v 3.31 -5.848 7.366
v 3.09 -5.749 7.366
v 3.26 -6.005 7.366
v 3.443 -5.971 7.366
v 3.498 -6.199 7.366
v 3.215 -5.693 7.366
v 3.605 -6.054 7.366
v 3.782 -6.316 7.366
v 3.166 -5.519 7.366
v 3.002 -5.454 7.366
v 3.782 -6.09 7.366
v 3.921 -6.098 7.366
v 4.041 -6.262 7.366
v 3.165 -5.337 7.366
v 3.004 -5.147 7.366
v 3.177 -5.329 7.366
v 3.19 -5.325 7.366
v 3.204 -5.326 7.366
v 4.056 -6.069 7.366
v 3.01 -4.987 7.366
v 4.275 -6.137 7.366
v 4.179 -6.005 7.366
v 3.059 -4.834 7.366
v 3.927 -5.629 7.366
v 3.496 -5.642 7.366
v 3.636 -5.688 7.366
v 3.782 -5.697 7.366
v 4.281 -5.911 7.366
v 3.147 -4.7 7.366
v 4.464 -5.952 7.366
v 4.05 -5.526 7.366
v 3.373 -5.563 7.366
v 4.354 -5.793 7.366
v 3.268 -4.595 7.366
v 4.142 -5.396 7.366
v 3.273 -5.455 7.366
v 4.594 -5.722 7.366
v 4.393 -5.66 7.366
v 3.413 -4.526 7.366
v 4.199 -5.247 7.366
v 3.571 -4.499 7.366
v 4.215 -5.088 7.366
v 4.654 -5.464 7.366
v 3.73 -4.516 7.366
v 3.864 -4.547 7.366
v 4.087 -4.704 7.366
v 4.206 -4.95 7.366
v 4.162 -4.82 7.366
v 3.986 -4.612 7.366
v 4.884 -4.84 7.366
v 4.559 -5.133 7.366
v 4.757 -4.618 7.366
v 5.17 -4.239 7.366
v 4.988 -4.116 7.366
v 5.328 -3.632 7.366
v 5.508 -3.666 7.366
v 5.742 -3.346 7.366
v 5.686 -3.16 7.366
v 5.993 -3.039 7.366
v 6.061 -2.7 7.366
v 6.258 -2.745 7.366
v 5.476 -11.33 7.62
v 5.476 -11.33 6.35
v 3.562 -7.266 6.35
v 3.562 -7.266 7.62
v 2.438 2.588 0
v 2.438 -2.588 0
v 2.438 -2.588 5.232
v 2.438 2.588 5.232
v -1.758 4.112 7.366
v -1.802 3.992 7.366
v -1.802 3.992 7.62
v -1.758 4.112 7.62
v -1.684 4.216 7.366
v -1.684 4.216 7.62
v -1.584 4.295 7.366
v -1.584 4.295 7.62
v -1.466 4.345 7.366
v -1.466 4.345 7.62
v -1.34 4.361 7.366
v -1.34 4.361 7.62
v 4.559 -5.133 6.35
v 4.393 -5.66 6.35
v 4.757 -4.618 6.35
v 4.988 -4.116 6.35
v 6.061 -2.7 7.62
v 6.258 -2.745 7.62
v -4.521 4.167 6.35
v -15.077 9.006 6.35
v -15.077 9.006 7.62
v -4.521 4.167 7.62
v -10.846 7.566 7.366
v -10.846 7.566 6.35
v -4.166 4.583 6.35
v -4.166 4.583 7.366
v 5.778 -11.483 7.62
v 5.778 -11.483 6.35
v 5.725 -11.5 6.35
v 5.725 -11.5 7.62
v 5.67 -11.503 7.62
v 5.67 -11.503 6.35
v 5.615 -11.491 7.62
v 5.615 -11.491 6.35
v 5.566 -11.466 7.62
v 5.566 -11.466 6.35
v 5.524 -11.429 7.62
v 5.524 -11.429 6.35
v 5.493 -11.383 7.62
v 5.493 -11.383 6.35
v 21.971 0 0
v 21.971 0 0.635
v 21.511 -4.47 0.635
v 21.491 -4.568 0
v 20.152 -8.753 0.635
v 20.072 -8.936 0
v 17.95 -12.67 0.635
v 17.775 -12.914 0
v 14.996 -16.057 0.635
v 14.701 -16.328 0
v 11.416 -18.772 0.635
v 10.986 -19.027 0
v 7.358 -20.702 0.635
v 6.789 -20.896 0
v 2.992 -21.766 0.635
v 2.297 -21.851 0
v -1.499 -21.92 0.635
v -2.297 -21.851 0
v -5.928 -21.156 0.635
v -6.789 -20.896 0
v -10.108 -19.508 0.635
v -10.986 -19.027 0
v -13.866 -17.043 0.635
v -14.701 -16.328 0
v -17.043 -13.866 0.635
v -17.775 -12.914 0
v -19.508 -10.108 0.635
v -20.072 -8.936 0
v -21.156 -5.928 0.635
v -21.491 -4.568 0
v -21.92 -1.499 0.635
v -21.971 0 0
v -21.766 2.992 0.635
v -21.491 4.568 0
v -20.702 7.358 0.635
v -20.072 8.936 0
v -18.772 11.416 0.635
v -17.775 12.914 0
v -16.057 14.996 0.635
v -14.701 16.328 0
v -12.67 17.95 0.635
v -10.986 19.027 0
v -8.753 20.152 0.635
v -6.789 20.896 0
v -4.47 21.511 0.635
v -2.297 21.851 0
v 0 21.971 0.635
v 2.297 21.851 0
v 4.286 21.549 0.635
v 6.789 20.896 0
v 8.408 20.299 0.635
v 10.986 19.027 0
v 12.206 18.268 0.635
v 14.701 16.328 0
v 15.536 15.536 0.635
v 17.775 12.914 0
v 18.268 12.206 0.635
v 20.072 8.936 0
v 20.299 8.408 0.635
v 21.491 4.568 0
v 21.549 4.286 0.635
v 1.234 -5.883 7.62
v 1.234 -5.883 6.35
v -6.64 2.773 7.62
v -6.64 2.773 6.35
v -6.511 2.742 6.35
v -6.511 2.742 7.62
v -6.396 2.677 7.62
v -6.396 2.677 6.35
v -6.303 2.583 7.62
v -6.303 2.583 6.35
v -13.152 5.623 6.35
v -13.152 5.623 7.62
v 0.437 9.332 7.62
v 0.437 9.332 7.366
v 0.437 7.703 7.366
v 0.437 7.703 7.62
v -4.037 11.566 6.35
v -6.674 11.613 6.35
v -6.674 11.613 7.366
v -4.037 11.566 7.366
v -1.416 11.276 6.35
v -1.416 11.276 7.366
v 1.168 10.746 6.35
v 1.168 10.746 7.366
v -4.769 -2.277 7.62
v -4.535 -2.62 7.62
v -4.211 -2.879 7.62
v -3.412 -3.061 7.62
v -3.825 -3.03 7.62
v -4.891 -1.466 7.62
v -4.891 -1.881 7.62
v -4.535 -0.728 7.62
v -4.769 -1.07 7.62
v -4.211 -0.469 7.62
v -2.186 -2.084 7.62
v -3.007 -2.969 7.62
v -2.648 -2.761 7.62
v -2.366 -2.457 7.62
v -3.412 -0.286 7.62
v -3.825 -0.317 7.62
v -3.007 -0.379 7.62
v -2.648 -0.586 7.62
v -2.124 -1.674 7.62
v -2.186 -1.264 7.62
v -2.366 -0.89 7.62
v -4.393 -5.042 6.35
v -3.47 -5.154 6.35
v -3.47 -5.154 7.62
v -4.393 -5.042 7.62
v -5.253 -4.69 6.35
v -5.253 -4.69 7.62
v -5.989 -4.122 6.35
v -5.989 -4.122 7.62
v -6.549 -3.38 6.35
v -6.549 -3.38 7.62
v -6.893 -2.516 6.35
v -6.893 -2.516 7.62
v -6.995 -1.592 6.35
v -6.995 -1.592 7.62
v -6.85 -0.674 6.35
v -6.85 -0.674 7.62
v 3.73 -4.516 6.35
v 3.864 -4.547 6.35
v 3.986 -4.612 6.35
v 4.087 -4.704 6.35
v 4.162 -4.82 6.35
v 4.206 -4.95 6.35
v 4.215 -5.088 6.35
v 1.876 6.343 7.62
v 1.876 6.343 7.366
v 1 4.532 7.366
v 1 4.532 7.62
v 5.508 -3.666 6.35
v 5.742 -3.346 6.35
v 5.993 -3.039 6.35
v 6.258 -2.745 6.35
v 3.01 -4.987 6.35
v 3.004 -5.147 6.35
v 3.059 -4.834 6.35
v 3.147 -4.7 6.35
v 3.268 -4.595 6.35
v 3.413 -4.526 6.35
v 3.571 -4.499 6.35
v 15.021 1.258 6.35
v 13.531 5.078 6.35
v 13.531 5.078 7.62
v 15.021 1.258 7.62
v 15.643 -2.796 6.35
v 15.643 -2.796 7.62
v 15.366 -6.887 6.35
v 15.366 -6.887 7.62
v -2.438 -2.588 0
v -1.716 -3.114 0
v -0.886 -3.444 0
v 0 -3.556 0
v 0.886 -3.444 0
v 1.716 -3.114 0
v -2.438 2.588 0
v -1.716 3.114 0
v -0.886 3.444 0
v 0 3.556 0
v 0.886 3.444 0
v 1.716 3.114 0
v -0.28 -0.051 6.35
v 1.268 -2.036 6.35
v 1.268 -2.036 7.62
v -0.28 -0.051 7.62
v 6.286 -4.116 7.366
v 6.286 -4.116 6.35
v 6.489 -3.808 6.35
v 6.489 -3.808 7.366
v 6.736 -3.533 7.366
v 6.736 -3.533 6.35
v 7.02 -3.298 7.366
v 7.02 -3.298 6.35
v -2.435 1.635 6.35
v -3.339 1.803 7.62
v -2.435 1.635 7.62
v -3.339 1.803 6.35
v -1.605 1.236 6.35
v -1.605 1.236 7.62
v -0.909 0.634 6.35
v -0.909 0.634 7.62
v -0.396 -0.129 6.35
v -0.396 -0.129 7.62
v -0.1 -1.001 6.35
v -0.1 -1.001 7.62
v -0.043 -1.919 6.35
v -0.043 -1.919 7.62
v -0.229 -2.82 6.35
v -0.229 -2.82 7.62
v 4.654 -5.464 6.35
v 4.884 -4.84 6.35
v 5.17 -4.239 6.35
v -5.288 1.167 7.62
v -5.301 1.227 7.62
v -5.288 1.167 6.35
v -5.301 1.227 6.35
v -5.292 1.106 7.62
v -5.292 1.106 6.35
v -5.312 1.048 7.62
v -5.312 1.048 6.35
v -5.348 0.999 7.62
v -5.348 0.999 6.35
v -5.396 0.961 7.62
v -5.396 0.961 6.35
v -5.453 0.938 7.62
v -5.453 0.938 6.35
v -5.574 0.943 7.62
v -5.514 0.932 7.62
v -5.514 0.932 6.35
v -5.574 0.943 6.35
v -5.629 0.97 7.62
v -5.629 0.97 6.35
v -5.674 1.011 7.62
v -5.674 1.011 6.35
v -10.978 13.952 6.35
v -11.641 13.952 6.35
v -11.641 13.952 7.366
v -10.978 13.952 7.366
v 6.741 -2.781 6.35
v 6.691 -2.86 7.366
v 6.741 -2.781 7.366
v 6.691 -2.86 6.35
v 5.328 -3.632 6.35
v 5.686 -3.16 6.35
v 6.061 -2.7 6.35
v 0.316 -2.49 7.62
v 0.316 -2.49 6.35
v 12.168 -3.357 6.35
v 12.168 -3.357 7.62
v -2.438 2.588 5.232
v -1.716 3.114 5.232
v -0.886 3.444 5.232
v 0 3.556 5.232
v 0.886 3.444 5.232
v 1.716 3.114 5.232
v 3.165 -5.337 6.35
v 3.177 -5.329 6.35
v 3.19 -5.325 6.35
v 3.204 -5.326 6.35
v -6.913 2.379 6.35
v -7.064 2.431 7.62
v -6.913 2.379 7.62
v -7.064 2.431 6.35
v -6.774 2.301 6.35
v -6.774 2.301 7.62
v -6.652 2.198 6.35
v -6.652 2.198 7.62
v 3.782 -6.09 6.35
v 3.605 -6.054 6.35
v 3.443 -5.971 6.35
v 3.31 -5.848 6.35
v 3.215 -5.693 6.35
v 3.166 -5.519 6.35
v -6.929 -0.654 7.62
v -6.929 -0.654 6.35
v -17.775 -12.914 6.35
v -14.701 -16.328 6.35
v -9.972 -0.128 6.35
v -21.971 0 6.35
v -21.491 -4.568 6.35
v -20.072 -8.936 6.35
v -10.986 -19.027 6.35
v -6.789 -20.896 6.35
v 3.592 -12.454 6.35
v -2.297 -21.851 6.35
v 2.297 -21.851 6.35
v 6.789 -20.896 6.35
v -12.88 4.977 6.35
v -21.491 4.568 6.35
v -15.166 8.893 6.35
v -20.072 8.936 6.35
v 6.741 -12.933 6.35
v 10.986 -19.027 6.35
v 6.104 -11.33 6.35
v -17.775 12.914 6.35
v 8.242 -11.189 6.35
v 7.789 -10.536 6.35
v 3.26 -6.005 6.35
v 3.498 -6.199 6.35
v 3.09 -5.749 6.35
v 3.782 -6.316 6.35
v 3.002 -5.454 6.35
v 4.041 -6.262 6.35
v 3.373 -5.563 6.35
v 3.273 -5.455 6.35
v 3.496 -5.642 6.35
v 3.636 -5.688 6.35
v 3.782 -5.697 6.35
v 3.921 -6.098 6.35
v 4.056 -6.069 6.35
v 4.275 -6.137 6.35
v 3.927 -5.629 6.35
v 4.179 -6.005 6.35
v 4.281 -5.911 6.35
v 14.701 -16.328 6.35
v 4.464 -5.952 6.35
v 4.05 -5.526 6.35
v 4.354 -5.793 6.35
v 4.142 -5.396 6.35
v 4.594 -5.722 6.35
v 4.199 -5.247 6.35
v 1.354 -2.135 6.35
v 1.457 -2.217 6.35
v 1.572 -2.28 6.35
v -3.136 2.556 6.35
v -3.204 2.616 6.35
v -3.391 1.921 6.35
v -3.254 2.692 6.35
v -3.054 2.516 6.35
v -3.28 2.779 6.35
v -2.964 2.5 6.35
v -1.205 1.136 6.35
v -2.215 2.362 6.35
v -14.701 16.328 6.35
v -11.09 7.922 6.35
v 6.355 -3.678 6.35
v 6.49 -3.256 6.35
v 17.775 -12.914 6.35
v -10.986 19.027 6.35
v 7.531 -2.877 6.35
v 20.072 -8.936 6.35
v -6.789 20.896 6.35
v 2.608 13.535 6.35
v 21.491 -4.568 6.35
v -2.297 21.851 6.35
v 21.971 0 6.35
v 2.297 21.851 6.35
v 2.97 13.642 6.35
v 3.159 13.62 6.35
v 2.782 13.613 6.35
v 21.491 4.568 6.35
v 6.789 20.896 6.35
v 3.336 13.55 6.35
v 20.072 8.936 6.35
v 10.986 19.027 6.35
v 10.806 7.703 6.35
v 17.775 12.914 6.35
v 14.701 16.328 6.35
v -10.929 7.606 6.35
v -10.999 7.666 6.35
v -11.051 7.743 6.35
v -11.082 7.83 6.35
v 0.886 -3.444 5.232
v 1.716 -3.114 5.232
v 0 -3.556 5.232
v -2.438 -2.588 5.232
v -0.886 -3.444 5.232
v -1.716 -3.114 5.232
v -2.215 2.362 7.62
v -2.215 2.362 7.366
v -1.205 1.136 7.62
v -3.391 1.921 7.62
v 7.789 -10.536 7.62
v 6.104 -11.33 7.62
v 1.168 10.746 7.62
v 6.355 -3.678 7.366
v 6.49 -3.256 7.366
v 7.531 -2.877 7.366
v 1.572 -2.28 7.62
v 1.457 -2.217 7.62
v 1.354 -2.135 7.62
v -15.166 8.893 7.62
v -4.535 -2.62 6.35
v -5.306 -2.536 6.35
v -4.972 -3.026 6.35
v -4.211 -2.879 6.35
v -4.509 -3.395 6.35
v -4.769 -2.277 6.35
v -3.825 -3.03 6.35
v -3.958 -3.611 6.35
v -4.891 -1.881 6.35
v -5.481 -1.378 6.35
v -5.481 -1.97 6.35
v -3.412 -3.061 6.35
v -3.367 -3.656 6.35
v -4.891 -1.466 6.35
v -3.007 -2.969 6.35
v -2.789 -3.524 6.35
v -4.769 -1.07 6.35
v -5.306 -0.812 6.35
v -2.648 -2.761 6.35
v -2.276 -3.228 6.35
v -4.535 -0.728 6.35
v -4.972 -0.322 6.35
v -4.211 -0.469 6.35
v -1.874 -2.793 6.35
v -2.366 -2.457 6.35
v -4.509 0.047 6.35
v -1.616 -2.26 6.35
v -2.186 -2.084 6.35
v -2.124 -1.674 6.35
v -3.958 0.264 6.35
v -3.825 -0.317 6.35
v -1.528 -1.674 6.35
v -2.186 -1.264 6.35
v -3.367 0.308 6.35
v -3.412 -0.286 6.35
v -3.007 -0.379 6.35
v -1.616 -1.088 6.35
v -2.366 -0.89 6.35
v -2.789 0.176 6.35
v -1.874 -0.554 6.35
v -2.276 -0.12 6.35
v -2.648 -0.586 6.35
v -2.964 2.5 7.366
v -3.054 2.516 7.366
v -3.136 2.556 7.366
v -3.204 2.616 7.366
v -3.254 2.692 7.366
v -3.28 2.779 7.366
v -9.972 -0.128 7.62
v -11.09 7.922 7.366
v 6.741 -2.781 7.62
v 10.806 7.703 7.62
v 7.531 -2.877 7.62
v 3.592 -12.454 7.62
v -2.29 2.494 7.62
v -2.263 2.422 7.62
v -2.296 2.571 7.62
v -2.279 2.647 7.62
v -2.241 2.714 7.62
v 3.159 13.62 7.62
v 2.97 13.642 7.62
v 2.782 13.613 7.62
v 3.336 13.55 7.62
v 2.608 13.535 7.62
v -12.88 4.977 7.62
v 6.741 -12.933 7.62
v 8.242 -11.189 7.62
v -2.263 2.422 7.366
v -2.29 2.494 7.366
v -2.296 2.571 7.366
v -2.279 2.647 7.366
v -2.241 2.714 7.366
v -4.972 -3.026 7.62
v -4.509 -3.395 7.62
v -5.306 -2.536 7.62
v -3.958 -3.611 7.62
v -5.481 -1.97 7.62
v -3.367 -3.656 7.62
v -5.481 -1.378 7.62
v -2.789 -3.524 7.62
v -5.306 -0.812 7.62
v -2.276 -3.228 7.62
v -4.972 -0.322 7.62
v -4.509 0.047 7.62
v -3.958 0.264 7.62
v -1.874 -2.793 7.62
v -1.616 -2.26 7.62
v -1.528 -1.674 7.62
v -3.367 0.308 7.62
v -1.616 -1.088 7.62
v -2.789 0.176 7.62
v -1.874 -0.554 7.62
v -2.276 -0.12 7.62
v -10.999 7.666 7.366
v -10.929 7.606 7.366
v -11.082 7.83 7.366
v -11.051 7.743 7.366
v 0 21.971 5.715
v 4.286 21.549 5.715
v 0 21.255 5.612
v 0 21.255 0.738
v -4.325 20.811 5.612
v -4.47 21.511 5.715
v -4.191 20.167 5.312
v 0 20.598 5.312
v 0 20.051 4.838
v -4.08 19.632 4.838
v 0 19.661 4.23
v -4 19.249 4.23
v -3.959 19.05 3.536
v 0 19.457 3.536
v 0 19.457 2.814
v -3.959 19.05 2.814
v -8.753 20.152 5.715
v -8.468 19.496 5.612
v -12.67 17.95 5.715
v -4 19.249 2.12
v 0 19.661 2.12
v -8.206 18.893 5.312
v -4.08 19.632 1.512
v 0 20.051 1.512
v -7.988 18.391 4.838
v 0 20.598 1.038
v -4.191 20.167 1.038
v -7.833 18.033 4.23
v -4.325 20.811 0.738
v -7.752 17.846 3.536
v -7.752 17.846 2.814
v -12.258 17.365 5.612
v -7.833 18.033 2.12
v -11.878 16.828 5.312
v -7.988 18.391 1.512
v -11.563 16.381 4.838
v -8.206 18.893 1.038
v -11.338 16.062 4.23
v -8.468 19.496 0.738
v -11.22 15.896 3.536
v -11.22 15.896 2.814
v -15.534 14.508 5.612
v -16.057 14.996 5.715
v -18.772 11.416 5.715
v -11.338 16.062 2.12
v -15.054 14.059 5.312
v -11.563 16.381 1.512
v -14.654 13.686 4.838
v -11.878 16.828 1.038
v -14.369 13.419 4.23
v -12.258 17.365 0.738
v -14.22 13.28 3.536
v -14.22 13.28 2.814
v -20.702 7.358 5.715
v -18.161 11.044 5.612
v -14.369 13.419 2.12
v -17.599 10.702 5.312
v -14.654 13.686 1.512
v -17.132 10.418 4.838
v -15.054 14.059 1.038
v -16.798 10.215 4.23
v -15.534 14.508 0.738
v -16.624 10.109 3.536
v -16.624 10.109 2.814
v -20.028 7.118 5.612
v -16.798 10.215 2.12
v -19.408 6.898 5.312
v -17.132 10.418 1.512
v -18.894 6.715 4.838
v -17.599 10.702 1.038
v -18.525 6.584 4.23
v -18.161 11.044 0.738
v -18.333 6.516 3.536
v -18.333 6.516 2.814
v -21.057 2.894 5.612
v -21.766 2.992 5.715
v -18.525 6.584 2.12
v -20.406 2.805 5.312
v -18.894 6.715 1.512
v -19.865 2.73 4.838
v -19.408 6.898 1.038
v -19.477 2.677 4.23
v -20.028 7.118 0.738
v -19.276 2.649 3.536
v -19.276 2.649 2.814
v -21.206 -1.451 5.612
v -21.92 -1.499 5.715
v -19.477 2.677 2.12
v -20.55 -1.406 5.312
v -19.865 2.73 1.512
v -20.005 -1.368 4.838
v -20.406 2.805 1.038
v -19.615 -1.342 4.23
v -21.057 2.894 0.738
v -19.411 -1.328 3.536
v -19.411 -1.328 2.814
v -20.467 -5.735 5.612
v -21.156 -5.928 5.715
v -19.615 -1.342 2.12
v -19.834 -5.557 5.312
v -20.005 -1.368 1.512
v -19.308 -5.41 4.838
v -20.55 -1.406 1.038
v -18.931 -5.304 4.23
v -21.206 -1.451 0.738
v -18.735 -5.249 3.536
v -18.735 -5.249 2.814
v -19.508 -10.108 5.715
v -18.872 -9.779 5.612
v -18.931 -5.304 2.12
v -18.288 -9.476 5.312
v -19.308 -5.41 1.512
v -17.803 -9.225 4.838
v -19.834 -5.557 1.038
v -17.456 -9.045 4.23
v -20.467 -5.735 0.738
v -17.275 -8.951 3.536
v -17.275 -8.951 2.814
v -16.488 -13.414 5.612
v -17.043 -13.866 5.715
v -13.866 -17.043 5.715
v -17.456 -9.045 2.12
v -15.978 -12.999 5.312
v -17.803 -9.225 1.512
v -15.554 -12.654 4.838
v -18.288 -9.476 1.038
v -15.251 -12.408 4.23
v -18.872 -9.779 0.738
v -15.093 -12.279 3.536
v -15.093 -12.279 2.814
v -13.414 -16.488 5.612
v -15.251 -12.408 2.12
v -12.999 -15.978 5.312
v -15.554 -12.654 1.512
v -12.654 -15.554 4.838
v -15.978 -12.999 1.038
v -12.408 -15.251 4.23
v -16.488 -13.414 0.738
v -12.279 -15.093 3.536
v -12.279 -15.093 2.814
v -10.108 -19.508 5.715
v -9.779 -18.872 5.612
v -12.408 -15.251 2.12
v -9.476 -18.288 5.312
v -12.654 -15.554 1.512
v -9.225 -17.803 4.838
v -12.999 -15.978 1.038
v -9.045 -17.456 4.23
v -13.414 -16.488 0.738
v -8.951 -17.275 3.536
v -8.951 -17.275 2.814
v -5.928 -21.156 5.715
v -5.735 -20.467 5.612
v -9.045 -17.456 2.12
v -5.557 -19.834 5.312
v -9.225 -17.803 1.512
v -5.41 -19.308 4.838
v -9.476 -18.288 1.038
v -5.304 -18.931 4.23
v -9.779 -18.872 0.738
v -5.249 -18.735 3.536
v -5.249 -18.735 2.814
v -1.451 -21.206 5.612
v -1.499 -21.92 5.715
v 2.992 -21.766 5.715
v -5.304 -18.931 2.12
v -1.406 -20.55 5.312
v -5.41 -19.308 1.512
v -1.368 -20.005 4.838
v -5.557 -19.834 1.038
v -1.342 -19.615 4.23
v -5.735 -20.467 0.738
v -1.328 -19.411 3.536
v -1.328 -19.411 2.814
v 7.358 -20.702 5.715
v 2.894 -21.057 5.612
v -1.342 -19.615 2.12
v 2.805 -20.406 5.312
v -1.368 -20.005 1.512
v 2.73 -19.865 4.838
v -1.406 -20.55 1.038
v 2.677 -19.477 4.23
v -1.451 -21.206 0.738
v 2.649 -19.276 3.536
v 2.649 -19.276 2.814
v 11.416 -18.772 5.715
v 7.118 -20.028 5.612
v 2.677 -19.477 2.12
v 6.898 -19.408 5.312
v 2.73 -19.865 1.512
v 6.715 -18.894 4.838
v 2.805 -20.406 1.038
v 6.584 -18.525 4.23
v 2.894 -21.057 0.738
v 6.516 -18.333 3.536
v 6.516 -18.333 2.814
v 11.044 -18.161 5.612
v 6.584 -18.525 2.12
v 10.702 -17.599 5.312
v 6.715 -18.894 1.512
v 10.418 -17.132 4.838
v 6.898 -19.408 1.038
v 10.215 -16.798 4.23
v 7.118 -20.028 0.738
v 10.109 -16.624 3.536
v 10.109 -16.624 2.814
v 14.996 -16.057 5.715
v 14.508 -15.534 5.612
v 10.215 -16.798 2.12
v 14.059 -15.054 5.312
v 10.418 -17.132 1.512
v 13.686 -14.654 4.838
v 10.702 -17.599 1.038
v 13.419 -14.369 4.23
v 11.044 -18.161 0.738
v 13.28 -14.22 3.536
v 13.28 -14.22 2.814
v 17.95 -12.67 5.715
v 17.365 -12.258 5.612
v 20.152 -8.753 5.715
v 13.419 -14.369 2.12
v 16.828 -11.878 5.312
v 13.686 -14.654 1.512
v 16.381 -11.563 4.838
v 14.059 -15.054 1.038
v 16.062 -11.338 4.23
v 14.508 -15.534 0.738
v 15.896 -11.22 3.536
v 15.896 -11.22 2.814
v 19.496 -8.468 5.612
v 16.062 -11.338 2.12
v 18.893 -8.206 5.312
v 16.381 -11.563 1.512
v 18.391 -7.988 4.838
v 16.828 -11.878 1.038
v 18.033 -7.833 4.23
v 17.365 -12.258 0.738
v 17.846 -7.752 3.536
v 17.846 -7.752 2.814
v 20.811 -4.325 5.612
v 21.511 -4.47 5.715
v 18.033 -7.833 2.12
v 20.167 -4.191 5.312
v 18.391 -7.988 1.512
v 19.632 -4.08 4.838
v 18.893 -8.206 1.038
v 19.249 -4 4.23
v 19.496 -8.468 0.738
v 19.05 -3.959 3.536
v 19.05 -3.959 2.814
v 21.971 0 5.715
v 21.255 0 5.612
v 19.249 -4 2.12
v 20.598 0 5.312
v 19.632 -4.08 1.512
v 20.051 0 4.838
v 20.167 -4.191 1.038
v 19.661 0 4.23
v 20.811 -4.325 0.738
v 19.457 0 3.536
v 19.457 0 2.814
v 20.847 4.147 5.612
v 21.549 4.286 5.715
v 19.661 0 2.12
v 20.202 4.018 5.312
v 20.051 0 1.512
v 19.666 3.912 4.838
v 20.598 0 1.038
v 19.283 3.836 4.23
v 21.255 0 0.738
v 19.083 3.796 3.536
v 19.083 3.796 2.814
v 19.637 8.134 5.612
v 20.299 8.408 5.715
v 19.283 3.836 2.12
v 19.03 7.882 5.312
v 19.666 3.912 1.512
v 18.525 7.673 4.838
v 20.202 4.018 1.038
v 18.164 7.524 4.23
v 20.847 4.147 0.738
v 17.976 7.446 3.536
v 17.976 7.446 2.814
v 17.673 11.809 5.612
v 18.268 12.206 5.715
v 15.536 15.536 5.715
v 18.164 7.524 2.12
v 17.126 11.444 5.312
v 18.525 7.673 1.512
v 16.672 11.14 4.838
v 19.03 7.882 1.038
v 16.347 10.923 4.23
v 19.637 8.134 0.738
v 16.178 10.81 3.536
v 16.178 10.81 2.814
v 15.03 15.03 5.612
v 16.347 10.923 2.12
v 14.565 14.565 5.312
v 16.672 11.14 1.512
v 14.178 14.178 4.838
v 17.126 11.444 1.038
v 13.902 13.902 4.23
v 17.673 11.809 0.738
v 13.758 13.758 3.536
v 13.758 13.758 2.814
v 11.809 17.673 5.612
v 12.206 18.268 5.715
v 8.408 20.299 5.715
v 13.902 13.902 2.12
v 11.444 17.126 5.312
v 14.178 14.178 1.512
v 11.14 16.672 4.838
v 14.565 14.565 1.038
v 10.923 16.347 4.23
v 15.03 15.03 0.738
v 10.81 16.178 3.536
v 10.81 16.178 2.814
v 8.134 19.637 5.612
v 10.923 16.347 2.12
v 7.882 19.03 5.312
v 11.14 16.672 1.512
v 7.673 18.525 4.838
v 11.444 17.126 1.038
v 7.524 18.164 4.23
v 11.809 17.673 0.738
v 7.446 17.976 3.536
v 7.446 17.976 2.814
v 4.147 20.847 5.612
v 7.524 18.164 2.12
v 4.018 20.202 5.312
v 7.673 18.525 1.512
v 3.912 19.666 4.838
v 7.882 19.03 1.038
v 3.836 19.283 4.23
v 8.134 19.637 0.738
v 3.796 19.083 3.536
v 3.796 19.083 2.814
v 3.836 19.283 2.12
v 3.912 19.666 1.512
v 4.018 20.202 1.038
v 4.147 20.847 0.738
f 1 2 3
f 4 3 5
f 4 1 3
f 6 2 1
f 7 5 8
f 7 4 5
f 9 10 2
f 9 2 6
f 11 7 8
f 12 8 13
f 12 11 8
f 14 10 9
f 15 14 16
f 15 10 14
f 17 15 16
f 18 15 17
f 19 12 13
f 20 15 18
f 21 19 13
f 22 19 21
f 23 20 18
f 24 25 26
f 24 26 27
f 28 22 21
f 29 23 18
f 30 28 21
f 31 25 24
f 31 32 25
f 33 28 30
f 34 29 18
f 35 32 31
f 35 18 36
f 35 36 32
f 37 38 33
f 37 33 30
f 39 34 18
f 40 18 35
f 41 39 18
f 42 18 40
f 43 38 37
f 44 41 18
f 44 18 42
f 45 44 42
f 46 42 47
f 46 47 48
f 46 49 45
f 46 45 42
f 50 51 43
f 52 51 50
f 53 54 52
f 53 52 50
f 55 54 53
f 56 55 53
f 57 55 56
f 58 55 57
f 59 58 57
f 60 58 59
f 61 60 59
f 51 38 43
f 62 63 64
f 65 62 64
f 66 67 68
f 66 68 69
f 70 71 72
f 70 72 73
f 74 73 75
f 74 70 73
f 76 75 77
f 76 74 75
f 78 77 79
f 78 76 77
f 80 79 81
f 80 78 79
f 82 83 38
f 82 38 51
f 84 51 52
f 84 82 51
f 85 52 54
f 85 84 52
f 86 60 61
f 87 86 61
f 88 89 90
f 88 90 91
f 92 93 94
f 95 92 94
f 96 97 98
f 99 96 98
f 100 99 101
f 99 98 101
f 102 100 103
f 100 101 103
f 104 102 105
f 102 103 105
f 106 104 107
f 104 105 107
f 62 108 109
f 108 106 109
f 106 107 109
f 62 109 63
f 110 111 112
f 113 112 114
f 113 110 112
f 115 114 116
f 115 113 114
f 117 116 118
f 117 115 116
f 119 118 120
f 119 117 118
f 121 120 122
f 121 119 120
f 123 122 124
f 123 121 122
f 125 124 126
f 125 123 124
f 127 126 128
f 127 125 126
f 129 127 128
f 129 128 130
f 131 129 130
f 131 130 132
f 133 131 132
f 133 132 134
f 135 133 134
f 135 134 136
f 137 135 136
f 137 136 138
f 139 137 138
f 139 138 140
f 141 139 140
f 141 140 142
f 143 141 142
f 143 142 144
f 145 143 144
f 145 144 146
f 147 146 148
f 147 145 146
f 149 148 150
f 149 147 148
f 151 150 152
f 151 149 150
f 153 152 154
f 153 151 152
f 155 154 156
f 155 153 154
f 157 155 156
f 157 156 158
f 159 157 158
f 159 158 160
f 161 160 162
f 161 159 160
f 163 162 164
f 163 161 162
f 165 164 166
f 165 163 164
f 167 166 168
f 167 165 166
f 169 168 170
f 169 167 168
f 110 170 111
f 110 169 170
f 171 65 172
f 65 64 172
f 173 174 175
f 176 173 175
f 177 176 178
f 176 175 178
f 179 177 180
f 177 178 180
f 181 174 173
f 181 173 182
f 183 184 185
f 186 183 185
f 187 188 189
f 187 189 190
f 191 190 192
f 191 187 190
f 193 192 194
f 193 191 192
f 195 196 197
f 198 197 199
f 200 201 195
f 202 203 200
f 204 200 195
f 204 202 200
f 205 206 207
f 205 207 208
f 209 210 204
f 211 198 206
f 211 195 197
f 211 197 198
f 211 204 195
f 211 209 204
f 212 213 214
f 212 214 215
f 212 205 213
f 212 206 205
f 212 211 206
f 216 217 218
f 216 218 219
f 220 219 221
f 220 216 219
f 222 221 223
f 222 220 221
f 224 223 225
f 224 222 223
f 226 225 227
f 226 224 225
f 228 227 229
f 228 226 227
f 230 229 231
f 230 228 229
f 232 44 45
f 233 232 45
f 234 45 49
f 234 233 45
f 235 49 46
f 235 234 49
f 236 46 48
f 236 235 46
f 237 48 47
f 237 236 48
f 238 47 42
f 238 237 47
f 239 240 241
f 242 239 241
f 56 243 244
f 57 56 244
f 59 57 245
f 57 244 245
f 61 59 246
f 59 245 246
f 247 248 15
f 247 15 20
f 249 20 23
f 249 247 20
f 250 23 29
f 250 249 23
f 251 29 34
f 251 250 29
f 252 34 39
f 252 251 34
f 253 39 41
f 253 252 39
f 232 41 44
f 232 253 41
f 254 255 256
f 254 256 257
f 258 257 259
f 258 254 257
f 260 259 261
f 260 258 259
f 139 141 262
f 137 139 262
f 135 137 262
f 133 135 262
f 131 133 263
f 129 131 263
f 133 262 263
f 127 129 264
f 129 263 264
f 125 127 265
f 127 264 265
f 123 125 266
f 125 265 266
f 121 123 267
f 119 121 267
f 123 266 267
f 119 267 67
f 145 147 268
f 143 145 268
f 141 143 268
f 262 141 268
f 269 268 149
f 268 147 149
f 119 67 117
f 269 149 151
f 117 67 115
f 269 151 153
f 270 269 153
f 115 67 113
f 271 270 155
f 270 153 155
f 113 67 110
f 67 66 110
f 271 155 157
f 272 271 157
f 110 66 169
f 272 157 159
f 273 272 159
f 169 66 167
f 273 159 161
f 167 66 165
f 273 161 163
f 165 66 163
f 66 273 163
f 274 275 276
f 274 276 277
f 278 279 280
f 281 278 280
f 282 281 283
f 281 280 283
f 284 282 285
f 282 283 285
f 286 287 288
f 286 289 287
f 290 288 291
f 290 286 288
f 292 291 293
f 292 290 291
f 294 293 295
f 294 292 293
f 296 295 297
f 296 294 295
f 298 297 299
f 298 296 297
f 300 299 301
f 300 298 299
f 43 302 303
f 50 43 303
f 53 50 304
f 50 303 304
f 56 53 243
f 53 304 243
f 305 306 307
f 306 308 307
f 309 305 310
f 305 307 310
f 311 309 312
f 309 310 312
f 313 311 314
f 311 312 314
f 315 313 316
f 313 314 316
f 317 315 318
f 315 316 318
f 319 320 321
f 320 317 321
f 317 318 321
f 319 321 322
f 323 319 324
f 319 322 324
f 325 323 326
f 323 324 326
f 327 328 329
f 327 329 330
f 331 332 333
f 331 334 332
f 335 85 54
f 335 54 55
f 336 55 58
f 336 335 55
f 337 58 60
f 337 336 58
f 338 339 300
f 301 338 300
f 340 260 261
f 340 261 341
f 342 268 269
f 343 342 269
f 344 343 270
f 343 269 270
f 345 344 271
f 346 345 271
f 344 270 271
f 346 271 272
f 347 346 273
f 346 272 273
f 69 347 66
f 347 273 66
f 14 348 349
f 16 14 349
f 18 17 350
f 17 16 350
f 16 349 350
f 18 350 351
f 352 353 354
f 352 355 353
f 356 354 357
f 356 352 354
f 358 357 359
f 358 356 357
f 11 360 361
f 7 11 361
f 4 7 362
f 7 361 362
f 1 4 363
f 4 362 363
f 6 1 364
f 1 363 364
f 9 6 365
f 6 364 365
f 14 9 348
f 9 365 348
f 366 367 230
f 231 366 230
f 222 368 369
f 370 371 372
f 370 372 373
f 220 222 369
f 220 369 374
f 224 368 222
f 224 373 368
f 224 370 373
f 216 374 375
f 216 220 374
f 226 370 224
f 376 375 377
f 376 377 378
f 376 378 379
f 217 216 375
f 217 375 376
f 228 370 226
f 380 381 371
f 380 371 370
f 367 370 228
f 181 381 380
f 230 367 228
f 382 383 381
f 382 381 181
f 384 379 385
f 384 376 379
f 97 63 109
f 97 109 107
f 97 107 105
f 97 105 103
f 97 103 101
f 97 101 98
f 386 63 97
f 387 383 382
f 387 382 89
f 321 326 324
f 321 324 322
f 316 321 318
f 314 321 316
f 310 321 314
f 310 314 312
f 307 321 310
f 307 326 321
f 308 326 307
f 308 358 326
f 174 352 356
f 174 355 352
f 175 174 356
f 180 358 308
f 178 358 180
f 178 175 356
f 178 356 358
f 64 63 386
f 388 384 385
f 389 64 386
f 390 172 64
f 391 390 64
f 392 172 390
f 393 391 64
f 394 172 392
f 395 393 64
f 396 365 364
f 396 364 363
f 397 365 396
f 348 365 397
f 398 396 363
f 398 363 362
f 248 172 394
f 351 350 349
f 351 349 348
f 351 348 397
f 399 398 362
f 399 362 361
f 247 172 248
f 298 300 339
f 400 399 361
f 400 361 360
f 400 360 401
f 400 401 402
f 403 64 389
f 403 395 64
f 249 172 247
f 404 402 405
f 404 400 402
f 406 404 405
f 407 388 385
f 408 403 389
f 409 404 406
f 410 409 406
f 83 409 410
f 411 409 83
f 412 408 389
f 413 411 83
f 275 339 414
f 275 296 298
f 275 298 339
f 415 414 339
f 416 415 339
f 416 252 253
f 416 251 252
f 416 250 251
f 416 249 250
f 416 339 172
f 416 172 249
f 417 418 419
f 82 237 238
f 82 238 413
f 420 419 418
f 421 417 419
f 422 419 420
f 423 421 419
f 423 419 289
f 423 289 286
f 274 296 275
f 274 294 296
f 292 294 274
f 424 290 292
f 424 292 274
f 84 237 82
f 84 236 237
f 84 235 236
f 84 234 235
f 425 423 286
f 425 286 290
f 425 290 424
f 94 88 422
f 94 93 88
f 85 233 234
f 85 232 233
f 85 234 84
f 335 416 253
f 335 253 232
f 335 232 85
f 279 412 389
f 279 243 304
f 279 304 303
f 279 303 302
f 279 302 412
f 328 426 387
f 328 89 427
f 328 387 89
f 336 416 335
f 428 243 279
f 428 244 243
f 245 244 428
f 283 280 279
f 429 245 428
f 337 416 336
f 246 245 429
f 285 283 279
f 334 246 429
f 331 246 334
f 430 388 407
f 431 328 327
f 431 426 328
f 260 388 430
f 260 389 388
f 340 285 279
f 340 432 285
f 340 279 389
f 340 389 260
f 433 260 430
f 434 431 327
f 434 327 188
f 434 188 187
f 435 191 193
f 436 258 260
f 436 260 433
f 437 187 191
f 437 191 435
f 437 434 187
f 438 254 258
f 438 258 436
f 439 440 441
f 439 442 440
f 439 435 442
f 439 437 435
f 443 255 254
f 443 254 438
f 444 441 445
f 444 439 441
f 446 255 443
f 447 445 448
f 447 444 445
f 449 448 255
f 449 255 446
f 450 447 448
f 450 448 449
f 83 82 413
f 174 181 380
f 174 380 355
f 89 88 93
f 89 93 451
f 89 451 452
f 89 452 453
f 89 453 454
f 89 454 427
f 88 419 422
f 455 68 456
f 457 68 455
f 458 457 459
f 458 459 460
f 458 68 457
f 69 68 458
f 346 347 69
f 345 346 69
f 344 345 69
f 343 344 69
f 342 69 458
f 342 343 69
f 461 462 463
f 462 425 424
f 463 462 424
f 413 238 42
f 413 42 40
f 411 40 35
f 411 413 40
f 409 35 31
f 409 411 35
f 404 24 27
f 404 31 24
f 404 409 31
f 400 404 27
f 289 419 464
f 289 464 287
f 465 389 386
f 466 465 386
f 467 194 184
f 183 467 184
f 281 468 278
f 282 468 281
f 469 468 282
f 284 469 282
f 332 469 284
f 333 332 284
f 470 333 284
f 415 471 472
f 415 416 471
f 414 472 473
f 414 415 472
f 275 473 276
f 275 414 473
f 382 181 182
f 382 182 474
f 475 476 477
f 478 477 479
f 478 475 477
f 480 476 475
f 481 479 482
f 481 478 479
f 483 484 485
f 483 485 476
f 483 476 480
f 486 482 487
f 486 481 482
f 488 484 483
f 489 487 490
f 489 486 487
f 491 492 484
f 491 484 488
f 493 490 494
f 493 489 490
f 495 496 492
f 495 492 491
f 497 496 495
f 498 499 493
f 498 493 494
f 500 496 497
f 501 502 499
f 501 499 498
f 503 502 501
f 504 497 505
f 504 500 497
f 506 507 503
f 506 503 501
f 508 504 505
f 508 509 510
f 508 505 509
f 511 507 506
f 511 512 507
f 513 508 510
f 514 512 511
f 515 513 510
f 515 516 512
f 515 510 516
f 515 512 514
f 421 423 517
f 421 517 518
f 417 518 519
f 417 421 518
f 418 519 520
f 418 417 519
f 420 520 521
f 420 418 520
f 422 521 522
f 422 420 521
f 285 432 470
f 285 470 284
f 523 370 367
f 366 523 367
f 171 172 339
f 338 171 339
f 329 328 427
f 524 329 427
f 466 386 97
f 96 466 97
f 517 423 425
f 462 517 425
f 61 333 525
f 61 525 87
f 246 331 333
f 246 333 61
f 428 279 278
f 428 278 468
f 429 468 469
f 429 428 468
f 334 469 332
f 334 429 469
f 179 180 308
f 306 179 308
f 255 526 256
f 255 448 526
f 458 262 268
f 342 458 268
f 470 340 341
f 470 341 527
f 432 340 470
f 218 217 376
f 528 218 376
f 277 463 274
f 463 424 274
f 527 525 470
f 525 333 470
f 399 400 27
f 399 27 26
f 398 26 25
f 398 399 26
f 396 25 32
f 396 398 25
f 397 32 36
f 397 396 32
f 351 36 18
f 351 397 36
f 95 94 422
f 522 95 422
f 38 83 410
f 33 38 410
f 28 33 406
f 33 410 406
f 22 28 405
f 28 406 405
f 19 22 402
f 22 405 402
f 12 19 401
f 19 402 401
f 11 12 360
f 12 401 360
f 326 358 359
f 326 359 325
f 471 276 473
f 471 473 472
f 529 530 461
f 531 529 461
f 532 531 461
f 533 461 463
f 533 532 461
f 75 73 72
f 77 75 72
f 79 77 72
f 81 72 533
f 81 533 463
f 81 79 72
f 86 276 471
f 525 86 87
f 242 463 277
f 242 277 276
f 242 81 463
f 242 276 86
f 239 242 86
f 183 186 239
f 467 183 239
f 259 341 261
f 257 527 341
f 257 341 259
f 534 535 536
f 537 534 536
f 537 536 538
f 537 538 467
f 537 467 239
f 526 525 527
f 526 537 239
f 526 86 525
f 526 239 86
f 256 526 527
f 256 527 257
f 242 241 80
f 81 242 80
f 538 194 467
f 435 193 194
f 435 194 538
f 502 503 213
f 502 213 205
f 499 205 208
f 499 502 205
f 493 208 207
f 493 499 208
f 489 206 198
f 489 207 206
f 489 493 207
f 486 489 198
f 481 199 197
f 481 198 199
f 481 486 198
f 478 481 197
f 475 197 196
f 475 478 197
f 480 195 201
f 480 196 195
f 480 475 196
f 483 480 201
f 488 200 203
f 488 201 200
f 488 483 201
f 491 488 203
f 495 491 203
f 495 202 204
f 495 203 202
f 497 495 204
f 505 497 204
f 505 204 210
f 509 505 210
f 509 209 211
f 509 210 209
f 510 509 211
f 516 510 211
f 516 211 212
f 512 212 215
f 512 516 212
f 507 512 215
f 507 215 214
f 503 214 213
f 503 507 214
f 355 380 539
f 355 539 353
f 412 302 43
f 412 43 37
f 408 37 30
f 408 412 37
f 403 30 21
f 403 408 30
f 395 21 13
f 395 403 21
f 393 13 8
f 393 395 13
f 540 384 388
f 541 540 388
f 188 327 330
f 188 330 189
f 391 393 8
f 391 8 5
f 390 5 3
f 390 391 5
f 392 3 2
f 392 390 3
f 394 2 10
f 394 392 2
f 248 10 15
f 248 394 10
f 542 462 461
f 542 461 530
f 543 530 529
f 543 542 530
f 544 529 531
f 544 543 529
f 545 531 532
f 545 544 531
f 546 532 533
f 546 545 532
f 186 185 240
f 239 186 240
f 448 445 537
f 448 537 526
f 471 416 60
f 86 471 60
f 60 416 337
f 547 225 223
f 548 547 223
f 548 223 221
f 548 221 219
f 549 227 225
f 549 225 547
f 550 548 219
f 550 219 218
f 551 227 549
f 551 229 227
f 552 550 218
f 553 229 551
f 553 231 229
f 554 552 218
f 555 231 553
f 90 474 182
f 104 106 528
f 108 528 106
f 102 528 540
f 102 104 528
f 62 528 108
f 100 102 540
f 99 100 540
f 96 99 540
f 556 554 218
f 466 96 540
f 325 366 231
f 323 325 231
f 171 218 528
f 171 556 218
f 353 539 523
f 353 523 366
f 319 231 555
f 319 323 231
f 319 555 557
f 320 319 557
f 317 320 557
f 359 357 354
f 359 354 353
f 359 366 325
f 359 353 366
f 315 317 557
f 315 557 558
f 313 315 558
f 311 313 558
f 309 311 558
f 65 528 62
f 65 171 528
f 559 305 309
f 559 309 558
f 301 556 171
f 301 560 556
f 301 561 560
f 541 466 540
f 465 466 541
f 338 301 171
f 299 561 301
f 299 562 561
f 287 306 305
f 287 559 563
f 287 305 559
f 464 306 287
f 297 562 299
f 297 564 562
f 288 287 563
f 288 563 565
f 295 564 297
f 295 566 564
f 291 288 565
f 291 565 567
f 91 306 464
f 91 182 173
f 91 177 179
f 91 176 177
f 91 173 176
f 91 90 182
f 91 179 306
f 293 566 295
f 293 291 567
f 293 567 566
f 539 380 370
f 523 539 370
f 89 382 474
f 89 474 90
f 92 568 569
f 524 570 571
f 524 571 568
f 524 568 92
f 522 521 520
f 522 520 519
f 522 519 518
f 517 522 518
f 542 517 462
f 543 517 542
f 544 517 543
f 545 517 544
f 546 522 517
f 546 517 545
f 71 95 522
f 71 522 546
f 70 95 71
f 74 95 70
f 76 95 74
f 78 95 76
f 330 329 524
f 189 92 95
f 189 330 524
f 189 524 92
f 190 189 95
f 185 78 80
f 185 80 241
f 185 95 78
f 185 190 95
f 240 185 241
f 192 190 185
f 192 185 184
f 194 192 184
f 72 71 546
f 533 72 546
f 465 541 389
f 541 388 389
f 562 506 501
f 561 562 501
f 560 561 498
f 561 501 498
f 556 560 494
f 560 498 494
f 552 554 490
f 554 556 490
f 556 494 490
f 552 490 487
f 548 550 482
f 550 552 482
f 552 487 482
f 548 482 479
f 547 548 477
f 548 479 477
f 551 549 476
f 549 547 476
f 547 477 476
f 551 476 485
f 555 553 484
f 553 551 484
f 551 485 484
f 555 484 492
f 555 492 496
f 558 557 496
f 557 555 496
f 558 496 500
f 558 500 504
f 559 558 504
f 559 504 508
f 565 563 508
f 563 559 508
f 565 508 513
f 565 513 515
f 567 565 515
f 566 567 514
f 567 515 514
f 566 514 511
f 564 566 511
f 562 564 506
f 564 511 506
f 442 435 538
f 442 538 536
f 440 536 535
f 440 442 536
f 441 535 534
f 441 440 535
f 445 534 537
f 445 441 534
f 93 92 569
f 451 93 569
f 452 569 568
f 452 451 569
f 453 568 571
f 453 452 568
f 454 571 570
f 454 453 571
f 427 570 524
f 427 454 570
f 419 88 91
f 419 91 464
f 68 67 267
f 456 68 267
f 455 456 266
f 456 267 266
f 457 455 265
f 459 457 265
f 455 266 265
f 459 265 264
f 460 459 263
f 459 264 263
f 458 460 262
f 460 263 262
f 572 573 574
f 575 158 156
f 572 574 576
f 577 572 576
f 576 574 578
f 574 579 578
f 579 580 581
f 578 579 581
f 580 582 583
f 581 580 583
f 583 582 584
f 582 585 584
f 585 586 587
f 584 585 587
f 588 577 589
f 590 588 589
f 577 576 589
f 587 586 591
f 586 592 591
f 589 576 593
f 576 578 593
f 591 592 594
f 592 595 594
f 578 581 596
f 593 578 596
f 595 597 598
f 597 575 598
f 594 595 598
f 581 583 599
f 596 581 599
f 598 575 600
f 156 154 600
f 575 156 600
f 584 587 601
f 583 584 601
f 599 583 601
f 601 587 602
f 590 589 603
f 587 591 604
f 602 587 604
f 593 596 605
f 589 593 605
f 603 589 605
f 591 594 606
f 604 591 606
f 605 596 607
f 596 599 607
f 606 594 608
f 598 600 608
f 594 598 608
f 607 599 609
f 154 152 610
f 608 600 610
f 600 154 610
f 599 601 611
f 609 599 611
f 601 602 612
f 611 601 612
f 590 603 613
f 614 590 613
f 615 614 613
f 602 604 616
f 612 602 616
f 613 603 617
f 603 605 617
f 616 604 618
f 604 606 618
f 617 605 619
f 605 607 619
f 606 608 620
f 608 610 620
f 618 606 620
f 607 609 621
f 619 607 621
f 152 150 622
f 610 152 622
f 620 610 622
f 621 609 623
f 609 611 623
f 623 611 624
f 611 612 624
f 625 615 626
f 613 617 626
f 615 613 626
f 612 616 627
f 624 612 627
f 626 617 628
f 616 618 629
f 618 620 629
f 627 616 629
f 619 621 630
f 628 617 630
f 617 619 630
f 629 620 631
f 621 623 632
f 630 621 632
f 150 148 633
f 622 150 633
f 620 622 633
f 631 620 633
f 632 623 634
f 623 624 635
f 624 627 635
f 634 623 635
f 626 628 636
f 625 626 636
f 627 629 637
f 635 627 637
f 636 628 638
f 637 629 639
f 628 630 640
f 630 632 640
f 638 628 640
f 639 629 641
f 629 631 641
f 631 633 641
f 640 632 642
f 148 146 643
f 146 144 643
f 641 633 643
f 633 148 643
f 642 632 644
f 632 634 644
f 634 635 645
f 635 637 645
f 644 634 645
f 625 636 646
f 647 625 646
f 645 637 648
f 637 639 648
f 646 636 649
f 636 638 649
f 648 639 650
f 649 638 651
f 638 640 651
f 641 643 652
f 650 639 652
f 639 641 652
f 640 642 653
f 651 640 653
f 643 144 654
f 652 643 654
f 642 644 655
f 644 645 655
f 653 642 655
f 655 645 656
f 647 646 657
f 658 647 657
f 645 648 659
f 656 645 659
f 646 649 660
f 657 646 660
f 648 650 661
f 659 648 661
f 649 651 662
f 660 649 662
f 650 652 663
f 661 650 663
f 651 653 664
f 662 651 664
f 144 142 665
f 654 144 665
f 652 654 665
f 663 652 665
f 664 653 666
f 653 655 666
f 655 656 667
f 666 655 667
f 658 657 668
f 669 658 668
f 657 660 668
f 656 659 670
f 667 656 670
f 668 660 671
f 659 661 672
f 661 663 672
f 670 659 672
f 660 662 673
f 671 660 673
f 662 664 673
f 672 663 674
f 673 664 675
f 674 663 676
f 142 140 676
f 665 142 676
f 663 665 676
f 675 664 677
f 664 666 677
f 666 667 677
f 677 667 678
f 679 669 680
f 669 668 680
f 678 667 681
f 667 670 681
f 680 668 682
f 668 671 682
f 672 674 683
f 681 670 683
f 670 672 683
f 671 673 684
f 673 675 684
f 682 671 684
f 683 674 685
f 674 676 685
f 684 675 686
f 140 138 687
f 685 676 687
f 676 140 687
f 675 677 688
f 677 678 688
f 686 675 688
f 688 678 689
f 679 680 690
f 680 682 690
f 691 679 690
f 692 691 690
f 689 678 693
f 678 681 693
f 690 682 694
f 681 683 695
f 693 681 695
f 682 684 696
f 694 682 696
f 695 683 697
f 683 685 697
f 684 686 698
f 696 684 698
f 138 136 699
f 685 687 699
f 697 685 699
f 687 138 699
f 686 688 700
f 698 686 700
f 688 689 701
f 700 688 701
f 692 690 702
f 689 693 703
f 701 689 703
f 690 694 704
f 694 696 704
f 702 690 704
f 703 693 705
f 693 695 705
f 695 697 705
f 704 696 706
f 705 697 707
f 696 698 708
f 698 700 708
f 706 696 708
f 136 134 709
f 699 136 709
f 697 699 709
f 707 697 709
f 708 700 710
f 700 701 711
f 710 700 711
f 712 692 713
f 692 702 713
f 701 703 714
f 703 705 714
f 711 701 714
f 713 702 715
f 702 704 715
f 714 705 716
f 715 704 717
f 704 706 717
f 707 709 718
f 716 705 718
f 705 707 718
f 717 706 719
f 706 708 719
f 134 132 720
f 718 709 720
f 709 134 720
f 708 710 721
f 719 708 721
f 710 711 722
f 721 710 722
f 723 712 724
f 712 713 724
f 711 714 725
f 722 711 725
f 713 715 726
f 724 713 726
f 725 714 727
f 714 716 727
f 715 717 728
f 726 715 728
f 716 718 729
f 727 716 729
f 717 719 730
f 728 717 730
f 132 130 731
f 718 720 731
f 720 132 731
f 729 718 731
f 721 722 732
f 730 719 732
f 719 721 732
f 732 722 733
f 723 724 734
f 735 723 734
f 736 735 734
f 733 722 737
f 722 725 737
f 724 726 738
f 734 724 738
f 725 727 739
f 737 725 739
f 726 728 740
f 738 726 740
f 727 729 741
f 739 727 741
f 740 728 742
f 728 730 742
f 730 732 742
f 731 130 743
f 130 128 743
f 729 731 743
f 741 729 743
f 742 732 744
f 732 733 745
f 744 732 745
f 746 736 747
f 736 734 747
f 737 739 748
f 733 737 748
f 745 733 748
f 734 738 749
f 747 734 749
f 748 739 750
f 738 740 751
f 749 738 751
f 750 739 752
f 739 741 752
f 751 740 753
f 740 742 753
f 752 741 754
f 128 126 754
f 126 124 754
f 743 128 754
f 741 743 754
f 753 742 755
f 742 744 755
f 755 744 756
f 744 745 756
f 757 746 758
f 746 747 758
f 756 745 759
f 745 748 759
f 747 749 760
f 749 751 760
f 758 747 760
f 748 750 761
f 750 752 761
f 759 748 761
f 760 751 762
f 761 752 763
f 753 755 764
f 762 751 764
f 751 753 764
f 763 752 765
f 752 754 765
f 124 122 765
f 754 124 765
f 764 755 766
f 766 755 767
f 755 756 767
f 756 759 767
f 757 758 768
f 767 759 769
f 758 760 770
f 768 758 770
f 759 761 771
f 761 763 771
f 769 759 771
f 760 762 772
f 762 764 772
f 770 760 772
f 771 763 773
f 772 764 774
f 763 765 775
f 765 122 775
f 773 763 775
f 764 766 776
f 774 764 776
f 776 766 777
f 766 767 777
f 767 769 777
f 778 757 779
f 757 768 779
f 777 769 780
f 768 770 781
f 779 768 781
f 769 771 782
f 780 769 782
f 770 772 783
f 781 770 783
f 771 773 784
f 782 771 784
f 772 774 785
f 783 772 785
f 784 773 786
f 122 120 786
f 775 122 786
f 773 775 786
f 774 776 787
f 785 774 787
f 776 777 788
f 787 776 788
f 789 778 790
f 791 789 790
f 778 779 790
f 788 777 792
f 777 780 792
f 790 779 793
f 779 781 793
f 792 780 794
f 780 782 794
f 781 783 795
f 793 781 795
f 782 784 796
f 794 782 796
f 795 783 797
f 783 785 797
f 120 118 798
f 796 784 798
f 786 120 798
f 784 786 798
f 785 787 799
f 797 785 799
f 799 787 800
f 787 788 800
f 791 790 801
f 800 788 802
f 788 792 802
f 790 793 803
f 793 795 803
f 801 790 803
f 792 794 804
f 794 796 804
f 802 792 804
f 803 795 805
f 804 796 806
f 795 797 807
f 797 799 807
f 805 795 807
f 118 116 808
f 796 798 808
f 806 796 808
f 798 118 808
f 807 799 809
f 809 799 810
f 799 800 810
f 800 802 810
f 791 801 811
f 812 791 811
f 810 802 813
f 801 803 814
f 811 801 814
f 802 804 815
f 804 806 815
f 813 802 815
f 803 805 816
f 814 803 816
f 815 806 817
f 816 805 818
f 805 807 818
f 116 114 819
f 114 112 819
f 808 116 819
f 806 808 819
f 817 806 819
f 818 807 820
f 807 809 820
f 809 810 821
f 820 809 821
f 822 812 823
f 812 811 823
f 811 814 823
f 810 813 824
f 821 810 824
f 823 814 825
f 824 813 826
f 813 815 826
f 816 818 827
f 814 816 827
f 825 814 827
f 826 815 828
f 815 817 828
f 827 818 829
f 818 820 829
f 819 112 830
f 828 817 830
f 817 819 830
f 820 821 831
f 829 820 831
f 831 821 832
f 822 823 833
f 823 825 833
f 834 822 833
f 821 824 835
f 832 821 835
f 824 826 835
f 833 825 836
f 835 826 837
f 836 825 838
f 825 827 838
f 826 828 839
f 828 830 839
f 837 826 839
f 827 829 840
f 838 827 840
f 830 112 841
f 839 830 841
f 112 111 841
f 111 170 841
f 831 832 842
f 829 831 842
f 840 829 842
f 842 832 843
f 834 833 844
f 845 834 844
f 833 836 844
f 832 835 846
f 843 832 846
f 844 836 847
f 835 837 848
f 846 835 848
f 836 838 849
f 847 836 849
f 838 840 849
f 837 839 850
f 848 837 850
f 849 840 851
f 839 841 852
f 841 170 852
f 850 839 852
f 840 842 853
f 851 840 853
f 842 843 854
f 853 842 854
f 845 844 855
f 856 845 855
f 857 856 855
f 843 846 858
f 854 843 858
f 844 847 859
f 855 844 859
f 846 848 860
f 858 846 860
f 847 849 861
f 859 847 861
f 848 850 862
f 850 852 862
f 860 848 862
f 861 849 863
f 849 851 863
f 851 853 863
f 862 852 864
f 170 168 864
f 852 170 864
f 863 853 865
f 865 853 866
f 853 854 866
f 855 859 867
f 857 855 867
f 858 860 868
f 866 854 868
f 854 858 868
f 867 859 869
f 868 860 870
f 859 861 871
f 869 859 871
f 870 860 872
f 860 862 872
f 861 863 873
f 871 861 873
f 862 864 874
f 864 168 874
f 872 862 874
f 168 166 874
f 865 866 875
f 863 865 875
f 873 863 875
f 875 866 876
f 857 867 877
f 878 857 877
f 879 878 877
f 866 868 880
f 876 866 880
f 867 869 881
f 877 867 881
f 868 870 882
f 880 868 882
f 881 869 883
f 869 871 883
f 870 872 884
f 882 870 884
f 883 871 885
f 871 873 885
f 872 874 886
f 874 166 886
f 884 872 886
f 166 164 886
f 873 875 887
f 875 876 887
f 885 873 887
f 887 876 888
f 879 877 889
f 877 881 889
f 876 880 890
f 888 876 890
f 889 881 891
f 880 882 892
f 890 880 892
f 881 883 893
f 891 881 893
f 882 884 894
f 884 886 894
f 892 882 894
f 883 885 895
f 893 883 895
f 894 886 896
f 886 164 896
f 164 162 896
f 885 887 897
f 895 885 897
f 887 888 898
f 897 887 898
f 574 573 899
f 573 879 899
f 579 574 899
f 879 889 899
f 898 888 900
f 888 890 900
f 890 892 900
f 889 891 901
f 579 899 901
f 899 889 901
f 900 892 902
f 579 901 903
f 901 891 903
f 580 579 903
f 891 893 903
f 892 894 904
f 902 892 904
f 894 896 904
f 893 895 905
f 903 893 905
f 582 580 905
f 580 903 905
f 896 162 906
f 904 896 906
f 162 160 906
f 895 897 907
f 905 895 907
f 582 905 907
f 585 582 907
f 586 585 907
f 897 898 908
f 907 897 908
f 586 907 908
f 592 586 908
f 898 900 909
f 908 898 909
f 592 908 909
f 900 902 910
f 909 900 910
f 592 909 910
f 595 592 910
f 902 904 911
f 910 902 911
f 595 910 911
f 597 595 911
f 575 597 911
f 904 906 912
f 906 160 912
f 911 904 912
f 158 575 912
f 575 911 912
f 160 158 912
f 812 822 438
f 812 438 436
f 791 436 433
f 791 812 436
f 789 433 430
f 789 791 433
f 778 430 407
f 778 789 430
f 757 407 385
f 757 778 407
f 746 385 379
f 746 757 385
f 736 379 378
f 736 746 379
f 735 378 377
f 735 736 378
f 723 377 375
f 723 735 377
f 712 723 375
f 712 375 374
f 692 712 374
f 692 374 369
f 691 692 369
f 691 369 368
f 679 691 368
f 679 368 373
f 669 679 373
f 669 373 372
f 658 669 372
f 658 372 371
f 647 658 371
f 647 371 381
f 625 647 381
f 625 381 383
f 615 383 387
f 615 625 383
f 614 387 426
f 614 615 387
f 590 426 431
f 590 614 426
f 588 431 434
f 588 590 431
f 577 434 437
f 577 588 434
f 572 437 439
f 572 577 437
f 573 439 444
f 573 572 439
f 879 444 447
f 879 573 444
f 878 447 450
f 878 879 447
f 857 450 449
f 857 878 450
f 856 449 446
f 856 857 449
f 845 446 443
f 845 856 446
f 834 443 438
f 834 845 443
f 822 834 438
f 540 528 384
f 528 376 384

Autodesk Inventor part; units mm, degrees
ref_plane "YZ Plane" through (0, 0, 0) normal (1, 0, 0) x (0, 1, 0)
ref_plane "XZ Plane" through (0, 0, 0) normal (0, 1, 0) x (-1, 0, 0)
ref_plane "XY Plane" through (0, 0, 0) normal (0, 0, 1) x (1, 0, 0)
sketch "Sketch1" plane through (0, 0, 0) normal (0, 0, 1) x (1, 0, 0)
  circle A0 centre (0, 0) radius 21.971
  dimension "d0" = 43.942
extrude "Extrusion1" add sketch "Sketch1" along normal blind 6.35
sketch "Sketch3" plane through (0, 0, 0) normal (1, 0, 0) x (0, 1, 0)
  line L0 (21.971, 0) -> (21.971, 6.35) projected
  circle A0 centre (21.971, 3.175) radius 2.54
  line L1 (0, -1.27) -> (0, 7.62) projected
  point P0 (0, 0)
  dimension "d37" = 5.08
revolve "Revolution1" cut sketch "Sketch3" angle 360 about axis through (0, 0, -10) along (0, 0, 1)
sketch "Sketch4" plane through (0, 0, 0) normal (0, 0, -1) x (-1, 0, 0)
  line L0 (2.4384, -2.5883) -> (2.4384, 2.5883)
  line L1 (-2.4384, -2.5883) -> (-2.4384, 2.5883)
  arc A0 (2.4384, 2.5883) -> (-2.4384, 2.5883) centre (0, 0) ccw
  arc A1 (-2.4384, -2.5883) -> (2.4384, -2.5883) centre (0, 0) ccw
  dimension "d44" = 4.8768
  dimension "d45" = 3.556
  dimension "d46" = 5.1766
  dimension "d47" = 2.4384
extrude "Extrusion3" cut sketch "Sketch4" against normal blind 5.2324
sketch "Sketch7" plane through (0, 0, 6.35) normal (0, 0, 1) x (1, 0, 0)
  line L0 (-16.6095, 17.2761) -> (16.9999, 17.2761) construction
  line L1 (16.9999, 17.2761) -> (16.9999, -16.3333) construction
  line L2 (16.9999, -16.3333) -> (-16.6095, -16.3333) construction
  line L3 (-16.6095, -16.3333) -> (-16.6095, 17.2761) construction
  line L4 (-11.6409, 13.9515) -> (-11.0896, 7.9216)
  line L5 (-10.846, 7.5655) -> (-4.1655, 4.5831)
  line L6 (-4.1655, 4.5831) -> (-3.2803, 2.7793)
  line L7 (-2.9643, 2.5005) -> (-2.215, 2.3615)
  arc A0 (-3.2803, 2.7793) -> (-2.9643, 2.5005) centre (-2.9521, 2.8328) ccw
  arc A1 (-11.0896, 7.9216) -> (-10.846, 7.5655) centre (-10.7308, 7.9057) ccw
  line L8 (-2.215, 2.3615) -> (-1.2053, 1.1357)
  circle A2 centre (-3.5155, -1.6738) radius 1.3912
  circle A3 centre (-3.5155, -1.6738) radius 1.9873
  arc A4 (-5.697, 1.0386) -> (-5.3458, 1.287) centre (-3.5155, -1.6738) ccw
  line L9 (-11.6409, 13.9515) -> (-10.9777, 13.9515)
  line L10 (-10.9777, 13.9515) -> (-6.6742, 11.6126)
  arc A5 (1.1675, 10.7462) -> (-6.6742, 11.6126) centre (-5.8633, -16.9682) ccw
  line L11 (1.1675, 10.7462) -> (2.608, 13.5351)
  arc A6 (3.3361, 13.55) -> (2.608, 13.5351) centre (2.9847, 12.9251) ccw
  line L12 (3.3361, 13.55) -> (10.8059, 7.7029)
  line L13 (10.8059, 7.7029) -> (13.5308, 5.0781)
  arc A7 (15.3657, -6.8873) -> (13.5308, 5.0781) centre (-3.032, -3.5852) ccw
  line L14 (15.3657, -6.8873) -> (12.1684, -3.357)
  line L15 (12.1684, -3.357) -> (7.5314, -2.8768)
  line L16 (7.5314, -2.8768) -> (7.0204, -3.2978)
  arc A8 (7.0204, -3.2978) -> (6.2865, -4.1165) centre (8.4411, -5.3095) ccw
  arc A9 (6.691, -2.8601) -> (6.2865, -4.1165) centre (9.098, -4.3284) ccw
  arc A10 (1.2675, -2.0364) -> (1.5721, -2.2799) centre (1.8757, -1.5881) ccw
  line L17 (1.2675, -2.0364) -> (-0.2802, -0.051)
  line L18 (-1.2053, 1.1357) -> (-0.2802, -0.051)
  line L19 (-15.1657, 8.8933) -> (-15.0771, 9.0065)
  line L20 (-15.0771, 9.0065) -> (-4.5214, 4.1672)
  line L21 (-4.5214, 4.1672) -> (-3.3907, 1.9212)
  line L22 (-6.652, 2.1979) -> (-5.6743, 1.0111)
  line L23 (-6.3027, 2.5826) -> (-5.3012, 1.2266)
  arc A11 (-5.6743, 1.0111) -> (-5.3012, 1.2266) centre (-5.5057, 1.15) ccw
  arc A12 (-6.652, 2.1979) -> (-7.0642, 2.431) centre (-7.2707, 1.5847) ccw
  arc A13 (-6.3027, 2.5826) -> (-6.6404, 2.7727) centre (-6.6833, 2.3015) ccw
  line L24 (-12.8802, 4.9767) -> (-7.0642, 2.431)
  line L25 (-6.6404, 2.7727) -> (-13.1518, 5.6227)
  line L26 (-13.1518, 5.6227) -> (-15.1657, 8.8933)
  line L27 (-12.8802, 4.9767) -> (-9.9722, -0.1277)
  line L28 (-9.9722, -0.1277) -> (-6.9287, -0.6545)
  arc A14 (4.2152, -5.0875) -> (3.7303, -4.5159) centre (3.6739, -5.0552) ccw
  arc A15 (3.7303, -4.5159) -> (3.0044, -5.147) centre (3.5903, -5.0878) ccw
  arc A16 (3.7824, -5.697) -> (4.2152, -5.0875) centre (3.5916, -5.1031) ccw
  arc A17 (3.2039, -5.3256) -> (3.7824, -5.697) centre (3.7454, -5.1184) ccw
  arc A18 (3.0044, -5.147) -> (3.7824, -6.3158) centre (4.0277, -5.3091) ccw
  arc A19 (3.1652, -5.3374) -> (3.7824, -6.0903) centre (3.8243, -5.4265) ccw
  arc A20 (3.2039, -5.3256) -> (3.1652, -5.3374) centre (3.1957, -5.3682) ccw
  arc A21 (3.7824, -6.0903) -> (4.3927, -5.66) centre (3.8814, -5.5828) ccw
  arc A22 (4.9875, -4.1165) -> (4.3927, -5.66) centre (12.9264, -8.0623) ccw
  arc A23 (3.7824, -6.3158) -> (4.654, -5.4642) centre (3.7228, -5.3829) ccw
  arc A24 (5.5077, -3.6657) -> (4.654, -5.4642) centre (11.7252, -7.7184) ccw
  line L29 (6.691, -2.8601) -> (6.7411, -2.781)
  line L30 (6.7411, -2.781) -> (6.2583, -2.745)
  arc A25 (6.2583, -2.745) -> (5.5077, -3.6657) centre (11.9972, -8.1901) ccw
  line L31 (1.5721, -2.2799) -> (6.0608, -2.7005)
  arc A26 (6.0608, -2.7005) -> (4.9875, -4.1165) centre (18.767, -13.4458) ccw
  line L32 (-6.9287, -0.6545) -> (-6.8497, -0.6741)
  line L33 (-3.4701, -5.1544) -> (3.5916, -12.454)
  line L34 (3.5916, -12.454) -> (6.7411, -12.9326)
  line L35 (6.7411, -12.9326) -> (8.2425, -11.189)
  line L36 (8.2425, -11.189) -> (7.7891, -10.5363)
  line L37 (7.7891, -10.5363) -> (6.1043, -11.3298)
  line L38 (6.1043, -11.3298) -> (5.7785, -11.4832)
  arc A27 (5.4757, -11.3297) -> (5.7785, -11.4832) centre (5.6869, -11.2886) ccw
  line L39 (5.4757, -11.3297) -> (3.5617, -7.266)
  line L40 (3.5617, -7.266) -> (1.2345, -5.8833)
  line L41 (1.2345, -5.8833) -> (0.3159, -2.4902)
  line L42 (0.3159, -2.4902) -> (-0.2289, -2.8205)
  line L43 (1.1675, 10.7462) -> (0.4371, 9.3321)
  line L44 (0.4371, 9.3321) -> (0.4371, 7.7029)
  line L45 (0.4371, 7.7029) -> (1.8757, 6.3431)
  line L46 (1.8757, 6.3431) -> (0.9998, 4.5316)
  line L47 (0.9998, 4.5316) -> (-1.3397, 4.3613)
  arc A28 (-1.3397, 4.3613) -> (-1.8021, 3.9921) centre (-1.3437, 3.8922) ccw
  line L48 (-1.8021, 3.9921) -> (-2.2406, 2.7138)
  arc A29 (-2.2406, 2.7138) -> (-2.215, 2.3615) centre (-2.0345, 2.5517) ccw
  line L49 (-3.3907, 1.9212) -> (-3.3394, 1.8026)
  line L50 (6.0608, -2.7005) -> (6.2583, -2.745)
  line L51 (6.7411, -2.781) -> (7.5314, -2.8768)
  point P0 (0, 0)
extrude "Extrusion5" add sketch "Sketch7" along normal blind 1.016 contours L9 L10 A5 L43 L44 L45 L46 L47 A28 L48 A29 L7 A0 L6 L5 A1 L4 | L16 A8 A9 L29 L51 | L50 A25 A24 A23 A18 A15 A14 A16 A17 A20 A19 A21 A22 A26
extrude "Extrusion6" add sketch "Sketch7" along normal blind 1.27 contours L11 A6 L12 L13 A7 L14 L15 L51 L30 L50 L31 A10 L17 L18 L8 A29 L48 A28 L47 L46 L45 L44 L43 | A2 | L22 A11 L23 A4 | A4 L32 L28 L27 L24 A12 L22 | A4 L42 L41 L40 L39 A27 L38 L37 L36 L35 L34 L33 | L23 A13 L25 L26 L19 L20 L21 L49 A4
properties part number "RTS Small Pharah Wheel"
